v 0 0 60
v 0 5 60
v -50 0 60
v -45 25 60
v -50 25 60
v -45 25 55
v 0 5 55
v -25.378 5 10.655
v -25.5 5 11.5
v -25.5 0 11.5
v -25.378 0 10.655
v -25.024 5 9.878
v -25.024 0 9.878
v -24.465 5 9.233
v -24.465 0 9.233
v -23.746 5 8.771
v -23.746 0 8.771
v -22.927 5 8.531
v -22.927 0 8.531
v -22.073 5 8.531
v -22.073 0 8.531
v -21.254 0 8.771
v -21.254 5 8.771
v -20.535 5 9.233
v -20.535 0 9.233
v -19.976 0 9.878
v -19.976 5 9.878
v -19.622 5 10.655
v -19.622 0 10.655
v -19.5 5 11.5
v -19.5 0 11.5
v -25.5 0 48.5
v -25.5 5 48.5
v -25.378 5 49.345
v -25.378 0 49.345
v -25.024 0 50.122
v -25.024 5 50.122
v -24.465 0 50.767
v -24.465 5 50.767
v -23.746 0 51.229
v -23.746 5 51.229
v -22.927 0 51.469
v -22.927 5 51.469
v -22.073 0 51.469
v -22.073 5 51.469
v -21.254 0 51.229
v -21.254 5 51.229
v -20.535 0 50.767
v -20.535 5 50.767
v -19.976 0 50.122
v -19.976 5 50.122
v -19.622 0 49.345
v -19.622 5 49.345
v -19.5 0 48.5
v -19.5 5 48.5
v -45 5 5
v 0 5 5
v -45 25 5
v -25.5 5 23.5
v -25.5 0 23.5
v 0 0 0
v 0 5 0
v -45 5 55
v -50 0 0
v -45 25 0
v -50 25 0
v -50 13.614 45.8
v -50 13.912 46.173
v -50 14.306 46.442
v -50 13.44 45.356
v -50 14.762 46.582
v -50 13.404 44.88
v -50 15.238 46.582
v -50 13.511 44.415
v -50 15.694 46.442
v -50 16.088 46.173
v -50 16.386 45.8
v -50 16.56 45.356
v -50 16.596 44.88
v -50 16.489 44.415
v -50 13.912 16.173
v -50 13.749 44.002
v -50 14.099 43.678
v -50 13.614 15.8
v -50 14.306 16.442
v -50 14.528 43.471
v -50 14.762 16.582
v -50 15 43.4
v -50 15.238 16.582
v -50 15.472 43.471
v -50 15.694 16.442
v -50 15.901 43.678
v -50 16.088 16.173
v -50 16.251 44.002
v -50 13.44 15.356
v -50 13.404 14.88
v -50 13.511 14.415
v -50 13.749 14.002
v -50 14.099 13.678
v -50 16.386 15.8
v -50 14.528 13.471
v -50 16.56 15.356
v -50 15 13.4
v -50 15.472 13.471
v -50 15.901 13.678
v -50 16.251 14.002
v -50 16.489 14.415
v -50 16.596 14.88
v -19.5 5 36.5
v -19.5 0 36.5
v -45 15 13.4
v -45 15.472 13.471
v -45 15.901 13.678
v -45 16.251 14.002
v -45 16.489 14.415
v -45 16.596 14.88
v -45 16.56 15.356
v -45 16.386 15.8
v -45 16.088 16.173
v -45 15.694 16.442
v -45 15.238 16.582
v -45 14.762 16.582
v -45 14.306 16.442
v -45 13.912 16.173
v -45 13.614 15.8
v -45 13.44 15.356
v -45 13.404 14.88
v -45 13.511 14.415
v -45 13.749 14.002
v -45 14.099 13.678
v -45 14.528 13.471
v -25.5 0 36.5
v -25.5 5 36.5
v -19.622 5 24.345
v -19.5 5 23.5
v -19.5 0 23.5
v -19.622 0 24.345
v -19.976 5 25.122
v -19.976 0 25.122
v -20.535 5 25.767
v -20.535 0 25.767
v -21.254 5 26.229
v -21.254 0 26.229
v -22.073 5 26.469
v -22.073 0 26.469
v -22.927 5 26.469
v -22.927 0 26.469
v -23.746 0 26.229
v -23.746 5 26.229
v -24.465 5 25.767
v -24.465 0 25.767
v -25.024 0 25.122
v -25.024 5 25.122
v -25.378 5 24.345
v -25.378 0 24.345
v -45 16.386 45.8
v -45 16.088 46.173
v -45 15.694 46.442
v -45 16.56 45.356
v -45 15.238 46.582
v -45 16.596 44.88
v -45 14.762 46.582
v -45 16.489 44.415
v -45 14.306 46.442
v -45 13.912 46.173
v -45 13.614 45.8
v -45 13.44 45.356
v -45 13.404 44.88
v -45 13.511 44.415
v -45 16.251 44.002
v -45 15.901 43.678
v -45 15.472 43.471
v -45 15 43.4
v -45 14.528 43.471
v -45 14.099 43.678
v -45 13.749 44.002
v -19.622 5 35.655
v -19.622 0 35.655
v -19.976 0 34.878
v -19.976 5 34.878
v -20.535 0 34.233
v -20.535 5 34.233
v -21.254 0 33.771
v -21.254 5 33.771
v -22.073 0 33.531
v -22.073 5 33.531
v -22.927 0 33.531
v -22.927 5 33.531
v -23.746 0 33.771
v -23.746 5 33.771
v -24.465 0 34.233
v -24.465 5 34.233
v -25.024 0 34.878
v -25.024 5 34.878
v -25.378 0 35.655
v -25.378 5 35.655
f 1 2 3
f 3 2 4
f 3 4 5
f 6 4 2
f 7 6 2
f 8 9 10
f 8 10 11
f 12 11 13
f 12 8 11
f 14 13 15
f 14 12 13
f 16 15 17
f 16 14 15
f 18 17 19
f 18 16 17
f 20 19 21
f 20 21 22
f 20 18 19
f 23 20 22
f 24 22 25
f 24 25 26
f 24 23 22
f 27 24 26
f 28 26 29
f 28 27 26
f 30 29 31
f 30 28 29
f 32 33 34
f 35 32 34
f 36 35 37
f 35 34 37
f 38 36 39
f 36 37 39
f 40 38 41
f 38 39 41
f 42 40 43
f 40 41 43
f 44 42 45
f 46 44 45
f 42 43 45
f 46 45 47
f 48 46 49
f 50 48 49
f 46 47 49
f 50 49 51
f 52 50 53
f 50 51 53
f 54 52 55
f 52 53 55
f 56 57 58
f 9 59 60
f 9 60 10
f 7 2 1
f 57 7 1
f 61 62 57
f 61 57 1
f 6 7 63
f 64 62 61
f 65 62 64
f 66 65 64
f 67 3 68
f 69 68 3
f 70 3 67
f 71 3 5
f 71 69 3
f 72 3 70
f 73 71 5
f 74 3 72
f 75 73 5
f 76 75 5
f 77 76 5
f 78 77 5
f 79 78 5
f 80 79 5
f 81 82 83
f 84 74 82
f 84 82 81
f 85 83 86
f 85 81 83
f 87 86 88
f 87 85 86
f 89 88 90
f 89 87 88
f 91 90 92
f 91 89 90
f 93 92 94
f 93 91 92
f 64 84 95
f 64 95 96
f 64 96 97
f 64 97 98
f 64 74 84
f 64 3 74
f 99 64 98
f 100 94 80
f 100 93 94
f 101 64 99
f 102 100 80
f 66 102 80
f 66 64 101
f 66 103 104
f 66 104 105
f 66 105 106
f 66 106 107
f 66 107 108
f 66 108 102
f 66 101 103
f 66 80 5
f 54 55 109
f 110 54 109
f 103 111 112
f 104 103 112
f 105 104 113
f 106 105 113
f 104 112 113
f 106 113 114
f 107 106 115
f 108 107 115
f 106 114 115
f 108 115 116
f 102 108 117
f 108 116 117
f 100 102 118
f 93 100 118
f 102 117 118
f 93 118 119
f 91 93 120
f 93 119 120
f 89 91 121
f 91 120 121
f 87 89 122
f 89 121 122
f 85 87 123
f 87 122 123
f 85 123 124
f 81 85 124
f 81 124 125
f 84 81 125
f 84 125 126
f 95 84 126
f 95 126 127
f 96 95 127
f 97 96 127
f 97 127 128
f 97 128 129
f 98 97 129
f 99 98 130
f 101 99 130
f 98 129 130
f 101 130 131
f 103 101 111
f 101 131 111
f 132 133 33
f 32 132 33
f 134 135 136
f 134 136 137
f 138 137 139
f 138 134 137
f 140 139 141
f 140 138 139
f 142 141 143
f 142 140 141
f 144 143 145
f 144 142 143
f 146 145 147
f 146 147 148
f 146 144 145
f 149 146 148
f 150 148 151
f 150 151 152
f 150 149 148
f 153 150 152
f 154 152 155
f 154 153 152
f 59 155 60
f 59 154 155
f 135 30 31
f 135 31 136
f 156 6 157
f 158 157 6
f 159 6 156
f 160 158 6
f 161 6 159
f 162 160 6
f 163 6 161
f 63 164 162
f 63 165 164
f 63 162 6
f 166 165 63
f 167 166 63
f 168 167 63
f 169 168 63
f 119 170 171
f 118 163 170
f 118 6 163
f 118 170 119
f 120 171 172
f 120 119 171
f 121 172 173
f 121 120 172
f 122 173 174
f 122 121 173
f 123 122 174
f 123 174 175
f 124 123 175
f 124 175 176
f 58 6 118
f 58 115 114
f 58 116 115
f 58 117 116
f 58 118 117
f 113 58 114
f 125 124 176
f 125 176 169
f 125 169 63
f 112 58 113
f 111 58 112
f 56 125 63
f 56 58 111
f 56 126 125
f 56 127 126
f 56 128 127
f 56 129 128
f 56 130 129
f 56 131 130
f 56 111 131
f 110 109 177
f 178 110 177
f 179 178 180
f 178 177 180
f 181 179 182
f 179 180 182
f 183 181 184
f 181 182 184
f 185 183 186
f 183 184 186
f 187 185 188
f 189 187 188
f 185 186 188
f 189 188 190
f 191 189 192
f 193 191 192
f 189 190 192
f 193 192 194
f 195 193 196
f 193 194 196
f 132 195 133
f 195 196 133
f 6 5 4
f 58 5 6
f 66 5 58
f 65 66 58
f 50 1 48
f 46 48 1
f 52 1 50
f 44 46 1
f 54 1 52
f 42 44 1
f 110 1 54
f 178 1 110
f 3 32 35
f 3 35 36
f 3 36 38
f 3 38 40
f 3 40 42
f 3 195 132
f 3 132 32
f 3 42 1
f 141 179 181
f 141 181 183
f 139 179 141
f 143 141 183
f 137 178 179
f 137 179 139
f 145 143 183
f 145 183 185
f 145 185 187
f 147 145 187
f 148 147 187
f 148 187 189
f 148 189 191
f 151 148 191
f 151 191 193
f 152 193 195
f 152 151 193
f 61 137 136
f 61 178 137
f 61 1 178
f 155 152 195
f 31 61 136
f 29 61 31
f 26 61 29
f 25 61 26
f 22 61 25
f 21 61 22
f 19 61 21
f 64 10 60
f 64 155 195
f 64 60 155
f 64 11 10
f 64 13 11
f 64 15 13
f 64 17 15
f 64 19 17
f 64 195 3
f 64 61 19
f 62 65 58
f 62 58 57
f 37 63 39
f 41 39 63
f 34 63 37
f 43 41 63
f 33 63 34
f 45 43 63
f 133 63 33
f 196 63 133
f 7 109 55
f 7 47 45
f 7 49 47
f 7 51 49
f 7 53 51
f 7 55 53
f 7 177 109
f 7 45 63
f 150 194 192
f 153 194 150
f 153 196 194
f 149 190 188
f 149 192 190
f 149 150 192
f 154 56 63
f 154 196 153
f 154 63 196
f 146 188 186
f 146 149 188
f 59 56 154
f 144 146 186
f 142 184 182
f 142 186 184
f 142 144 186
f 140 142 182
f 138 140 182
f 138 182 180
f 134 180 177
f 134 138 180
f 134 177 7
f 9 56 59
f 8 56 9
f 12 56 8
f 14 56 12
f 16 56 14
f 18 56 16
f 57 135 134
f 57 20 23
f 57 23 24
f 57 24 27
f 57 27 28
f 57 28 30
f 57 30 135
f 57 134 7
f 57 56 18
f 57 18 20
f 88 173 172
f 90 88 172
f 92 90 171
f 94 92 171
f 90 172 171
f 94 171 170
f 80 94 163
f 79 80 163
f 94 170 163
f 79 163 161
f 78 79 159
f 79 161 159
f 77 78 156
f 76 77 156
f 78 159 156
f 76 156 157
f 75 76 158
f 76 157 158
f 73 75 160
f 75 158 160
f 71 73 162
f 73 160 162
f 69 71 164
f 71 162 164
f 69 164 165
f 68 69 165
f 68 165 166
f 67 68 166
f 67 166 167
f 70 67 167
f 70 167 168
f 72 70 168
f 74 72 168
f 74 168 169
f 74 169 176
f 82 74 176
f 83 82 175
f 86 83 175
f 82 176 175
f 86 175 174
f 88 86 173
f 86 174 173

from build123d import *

# Parameters (mm, degrees)
BOSS_EXTRUDE1_DEPTH = 60
BOSS_EXTRUDE2_DEPTH = 5
BOSS_EXTRUDE3_DEPTH = 5
SKETCH4_R           = 1.6
CUT_EXTRUDE1_DEPTH  = 5
CUT_EXTRUDE2_DEPTH  = 5


with BuildPart() as part:
    # Sketch1 → Boss-Extrude1 (new body)
    with BuildSketch(Plane.XY):
        Polygon((0, 0), (-50, 0), (-50, 25), (-45, 25), (-45, 5), (0, 5), align=None)
    extrude(amount=BOSS_EXTRUDE1_DEPTH)

    # Sketch2 → Boss-Extrude2 (add)
    with BuildSketch(Plane.XY.offset(60)):
        Polygon((-45, 25), (0, 5), (-45, 5), align=None)
    extrude(amount=-BOSS_EXTRUDE2_DEPTH)

    # Sketch3 → Boss-Extrude3 (add)
    with BuildSketch(Plane(origin=(0, 0, 0), x_dir=(-1, 0, 0), z_dir=(0, 0, -1))):
        Polygon((45, 25), (0, 5), (45, 5), align=None)
    extrude(amount=-BOSS_EXTRUDE3_DEPTH)

    # Sketch4 → Cut-Extrude1 (cut)
    with BuildSketch(Plane(origin=(-45, 0, 0), x_dir=(0, 0, -1), z_dir=(1, 0, 0))):
        with Locations((-45, 15)):
            Circle(SKETCH4_R)
        with Locations((-15, 15)):
            Circle(SKETCH4_R)
    extrude(amount=-CUT_EXTRUDE1_DEPTH, mode=Mode.SUBTRACT)

    # Sketch5 → Cut-Extrude2 (cut)
    with BuildSketch(Plane(origin=(0, 5, 0), x_dir=(1, 0, 0), z_dir=(0, 1, 0))):
        with BuildLine():
            Line((-25.5, -23.5), (-25.5, -11.5))
            ThreePointArc((-25.5, -11.5), (-22.5, -8.5), (-19.5, -11.5))
            Line((-19.5, -11.5), (-19.5, -23.5))
            ThreePointArc((-19.5, -23.5), (-22.5, -26.5), (-25.5, -23.5))
        make_face()
        with BuildLine():
            Line((-19.5, -48.5), (-19.5, -36.5))
            ThreePointArc((-19.5, -36.5), (-22.5, -33.5), (-25.5, -36.5))
            Line((-25.5, -36.5), (-25.5, -48.5))
            ThreePointArc((-25.5, -48.5), (-22.5, -51.5), (-19.5, -48.5))
        make_face()
    extrude(amount=-CUT_EXTRUDE2_DEPTH, mode=Mode.SUBTRACT)


solid = part.part
